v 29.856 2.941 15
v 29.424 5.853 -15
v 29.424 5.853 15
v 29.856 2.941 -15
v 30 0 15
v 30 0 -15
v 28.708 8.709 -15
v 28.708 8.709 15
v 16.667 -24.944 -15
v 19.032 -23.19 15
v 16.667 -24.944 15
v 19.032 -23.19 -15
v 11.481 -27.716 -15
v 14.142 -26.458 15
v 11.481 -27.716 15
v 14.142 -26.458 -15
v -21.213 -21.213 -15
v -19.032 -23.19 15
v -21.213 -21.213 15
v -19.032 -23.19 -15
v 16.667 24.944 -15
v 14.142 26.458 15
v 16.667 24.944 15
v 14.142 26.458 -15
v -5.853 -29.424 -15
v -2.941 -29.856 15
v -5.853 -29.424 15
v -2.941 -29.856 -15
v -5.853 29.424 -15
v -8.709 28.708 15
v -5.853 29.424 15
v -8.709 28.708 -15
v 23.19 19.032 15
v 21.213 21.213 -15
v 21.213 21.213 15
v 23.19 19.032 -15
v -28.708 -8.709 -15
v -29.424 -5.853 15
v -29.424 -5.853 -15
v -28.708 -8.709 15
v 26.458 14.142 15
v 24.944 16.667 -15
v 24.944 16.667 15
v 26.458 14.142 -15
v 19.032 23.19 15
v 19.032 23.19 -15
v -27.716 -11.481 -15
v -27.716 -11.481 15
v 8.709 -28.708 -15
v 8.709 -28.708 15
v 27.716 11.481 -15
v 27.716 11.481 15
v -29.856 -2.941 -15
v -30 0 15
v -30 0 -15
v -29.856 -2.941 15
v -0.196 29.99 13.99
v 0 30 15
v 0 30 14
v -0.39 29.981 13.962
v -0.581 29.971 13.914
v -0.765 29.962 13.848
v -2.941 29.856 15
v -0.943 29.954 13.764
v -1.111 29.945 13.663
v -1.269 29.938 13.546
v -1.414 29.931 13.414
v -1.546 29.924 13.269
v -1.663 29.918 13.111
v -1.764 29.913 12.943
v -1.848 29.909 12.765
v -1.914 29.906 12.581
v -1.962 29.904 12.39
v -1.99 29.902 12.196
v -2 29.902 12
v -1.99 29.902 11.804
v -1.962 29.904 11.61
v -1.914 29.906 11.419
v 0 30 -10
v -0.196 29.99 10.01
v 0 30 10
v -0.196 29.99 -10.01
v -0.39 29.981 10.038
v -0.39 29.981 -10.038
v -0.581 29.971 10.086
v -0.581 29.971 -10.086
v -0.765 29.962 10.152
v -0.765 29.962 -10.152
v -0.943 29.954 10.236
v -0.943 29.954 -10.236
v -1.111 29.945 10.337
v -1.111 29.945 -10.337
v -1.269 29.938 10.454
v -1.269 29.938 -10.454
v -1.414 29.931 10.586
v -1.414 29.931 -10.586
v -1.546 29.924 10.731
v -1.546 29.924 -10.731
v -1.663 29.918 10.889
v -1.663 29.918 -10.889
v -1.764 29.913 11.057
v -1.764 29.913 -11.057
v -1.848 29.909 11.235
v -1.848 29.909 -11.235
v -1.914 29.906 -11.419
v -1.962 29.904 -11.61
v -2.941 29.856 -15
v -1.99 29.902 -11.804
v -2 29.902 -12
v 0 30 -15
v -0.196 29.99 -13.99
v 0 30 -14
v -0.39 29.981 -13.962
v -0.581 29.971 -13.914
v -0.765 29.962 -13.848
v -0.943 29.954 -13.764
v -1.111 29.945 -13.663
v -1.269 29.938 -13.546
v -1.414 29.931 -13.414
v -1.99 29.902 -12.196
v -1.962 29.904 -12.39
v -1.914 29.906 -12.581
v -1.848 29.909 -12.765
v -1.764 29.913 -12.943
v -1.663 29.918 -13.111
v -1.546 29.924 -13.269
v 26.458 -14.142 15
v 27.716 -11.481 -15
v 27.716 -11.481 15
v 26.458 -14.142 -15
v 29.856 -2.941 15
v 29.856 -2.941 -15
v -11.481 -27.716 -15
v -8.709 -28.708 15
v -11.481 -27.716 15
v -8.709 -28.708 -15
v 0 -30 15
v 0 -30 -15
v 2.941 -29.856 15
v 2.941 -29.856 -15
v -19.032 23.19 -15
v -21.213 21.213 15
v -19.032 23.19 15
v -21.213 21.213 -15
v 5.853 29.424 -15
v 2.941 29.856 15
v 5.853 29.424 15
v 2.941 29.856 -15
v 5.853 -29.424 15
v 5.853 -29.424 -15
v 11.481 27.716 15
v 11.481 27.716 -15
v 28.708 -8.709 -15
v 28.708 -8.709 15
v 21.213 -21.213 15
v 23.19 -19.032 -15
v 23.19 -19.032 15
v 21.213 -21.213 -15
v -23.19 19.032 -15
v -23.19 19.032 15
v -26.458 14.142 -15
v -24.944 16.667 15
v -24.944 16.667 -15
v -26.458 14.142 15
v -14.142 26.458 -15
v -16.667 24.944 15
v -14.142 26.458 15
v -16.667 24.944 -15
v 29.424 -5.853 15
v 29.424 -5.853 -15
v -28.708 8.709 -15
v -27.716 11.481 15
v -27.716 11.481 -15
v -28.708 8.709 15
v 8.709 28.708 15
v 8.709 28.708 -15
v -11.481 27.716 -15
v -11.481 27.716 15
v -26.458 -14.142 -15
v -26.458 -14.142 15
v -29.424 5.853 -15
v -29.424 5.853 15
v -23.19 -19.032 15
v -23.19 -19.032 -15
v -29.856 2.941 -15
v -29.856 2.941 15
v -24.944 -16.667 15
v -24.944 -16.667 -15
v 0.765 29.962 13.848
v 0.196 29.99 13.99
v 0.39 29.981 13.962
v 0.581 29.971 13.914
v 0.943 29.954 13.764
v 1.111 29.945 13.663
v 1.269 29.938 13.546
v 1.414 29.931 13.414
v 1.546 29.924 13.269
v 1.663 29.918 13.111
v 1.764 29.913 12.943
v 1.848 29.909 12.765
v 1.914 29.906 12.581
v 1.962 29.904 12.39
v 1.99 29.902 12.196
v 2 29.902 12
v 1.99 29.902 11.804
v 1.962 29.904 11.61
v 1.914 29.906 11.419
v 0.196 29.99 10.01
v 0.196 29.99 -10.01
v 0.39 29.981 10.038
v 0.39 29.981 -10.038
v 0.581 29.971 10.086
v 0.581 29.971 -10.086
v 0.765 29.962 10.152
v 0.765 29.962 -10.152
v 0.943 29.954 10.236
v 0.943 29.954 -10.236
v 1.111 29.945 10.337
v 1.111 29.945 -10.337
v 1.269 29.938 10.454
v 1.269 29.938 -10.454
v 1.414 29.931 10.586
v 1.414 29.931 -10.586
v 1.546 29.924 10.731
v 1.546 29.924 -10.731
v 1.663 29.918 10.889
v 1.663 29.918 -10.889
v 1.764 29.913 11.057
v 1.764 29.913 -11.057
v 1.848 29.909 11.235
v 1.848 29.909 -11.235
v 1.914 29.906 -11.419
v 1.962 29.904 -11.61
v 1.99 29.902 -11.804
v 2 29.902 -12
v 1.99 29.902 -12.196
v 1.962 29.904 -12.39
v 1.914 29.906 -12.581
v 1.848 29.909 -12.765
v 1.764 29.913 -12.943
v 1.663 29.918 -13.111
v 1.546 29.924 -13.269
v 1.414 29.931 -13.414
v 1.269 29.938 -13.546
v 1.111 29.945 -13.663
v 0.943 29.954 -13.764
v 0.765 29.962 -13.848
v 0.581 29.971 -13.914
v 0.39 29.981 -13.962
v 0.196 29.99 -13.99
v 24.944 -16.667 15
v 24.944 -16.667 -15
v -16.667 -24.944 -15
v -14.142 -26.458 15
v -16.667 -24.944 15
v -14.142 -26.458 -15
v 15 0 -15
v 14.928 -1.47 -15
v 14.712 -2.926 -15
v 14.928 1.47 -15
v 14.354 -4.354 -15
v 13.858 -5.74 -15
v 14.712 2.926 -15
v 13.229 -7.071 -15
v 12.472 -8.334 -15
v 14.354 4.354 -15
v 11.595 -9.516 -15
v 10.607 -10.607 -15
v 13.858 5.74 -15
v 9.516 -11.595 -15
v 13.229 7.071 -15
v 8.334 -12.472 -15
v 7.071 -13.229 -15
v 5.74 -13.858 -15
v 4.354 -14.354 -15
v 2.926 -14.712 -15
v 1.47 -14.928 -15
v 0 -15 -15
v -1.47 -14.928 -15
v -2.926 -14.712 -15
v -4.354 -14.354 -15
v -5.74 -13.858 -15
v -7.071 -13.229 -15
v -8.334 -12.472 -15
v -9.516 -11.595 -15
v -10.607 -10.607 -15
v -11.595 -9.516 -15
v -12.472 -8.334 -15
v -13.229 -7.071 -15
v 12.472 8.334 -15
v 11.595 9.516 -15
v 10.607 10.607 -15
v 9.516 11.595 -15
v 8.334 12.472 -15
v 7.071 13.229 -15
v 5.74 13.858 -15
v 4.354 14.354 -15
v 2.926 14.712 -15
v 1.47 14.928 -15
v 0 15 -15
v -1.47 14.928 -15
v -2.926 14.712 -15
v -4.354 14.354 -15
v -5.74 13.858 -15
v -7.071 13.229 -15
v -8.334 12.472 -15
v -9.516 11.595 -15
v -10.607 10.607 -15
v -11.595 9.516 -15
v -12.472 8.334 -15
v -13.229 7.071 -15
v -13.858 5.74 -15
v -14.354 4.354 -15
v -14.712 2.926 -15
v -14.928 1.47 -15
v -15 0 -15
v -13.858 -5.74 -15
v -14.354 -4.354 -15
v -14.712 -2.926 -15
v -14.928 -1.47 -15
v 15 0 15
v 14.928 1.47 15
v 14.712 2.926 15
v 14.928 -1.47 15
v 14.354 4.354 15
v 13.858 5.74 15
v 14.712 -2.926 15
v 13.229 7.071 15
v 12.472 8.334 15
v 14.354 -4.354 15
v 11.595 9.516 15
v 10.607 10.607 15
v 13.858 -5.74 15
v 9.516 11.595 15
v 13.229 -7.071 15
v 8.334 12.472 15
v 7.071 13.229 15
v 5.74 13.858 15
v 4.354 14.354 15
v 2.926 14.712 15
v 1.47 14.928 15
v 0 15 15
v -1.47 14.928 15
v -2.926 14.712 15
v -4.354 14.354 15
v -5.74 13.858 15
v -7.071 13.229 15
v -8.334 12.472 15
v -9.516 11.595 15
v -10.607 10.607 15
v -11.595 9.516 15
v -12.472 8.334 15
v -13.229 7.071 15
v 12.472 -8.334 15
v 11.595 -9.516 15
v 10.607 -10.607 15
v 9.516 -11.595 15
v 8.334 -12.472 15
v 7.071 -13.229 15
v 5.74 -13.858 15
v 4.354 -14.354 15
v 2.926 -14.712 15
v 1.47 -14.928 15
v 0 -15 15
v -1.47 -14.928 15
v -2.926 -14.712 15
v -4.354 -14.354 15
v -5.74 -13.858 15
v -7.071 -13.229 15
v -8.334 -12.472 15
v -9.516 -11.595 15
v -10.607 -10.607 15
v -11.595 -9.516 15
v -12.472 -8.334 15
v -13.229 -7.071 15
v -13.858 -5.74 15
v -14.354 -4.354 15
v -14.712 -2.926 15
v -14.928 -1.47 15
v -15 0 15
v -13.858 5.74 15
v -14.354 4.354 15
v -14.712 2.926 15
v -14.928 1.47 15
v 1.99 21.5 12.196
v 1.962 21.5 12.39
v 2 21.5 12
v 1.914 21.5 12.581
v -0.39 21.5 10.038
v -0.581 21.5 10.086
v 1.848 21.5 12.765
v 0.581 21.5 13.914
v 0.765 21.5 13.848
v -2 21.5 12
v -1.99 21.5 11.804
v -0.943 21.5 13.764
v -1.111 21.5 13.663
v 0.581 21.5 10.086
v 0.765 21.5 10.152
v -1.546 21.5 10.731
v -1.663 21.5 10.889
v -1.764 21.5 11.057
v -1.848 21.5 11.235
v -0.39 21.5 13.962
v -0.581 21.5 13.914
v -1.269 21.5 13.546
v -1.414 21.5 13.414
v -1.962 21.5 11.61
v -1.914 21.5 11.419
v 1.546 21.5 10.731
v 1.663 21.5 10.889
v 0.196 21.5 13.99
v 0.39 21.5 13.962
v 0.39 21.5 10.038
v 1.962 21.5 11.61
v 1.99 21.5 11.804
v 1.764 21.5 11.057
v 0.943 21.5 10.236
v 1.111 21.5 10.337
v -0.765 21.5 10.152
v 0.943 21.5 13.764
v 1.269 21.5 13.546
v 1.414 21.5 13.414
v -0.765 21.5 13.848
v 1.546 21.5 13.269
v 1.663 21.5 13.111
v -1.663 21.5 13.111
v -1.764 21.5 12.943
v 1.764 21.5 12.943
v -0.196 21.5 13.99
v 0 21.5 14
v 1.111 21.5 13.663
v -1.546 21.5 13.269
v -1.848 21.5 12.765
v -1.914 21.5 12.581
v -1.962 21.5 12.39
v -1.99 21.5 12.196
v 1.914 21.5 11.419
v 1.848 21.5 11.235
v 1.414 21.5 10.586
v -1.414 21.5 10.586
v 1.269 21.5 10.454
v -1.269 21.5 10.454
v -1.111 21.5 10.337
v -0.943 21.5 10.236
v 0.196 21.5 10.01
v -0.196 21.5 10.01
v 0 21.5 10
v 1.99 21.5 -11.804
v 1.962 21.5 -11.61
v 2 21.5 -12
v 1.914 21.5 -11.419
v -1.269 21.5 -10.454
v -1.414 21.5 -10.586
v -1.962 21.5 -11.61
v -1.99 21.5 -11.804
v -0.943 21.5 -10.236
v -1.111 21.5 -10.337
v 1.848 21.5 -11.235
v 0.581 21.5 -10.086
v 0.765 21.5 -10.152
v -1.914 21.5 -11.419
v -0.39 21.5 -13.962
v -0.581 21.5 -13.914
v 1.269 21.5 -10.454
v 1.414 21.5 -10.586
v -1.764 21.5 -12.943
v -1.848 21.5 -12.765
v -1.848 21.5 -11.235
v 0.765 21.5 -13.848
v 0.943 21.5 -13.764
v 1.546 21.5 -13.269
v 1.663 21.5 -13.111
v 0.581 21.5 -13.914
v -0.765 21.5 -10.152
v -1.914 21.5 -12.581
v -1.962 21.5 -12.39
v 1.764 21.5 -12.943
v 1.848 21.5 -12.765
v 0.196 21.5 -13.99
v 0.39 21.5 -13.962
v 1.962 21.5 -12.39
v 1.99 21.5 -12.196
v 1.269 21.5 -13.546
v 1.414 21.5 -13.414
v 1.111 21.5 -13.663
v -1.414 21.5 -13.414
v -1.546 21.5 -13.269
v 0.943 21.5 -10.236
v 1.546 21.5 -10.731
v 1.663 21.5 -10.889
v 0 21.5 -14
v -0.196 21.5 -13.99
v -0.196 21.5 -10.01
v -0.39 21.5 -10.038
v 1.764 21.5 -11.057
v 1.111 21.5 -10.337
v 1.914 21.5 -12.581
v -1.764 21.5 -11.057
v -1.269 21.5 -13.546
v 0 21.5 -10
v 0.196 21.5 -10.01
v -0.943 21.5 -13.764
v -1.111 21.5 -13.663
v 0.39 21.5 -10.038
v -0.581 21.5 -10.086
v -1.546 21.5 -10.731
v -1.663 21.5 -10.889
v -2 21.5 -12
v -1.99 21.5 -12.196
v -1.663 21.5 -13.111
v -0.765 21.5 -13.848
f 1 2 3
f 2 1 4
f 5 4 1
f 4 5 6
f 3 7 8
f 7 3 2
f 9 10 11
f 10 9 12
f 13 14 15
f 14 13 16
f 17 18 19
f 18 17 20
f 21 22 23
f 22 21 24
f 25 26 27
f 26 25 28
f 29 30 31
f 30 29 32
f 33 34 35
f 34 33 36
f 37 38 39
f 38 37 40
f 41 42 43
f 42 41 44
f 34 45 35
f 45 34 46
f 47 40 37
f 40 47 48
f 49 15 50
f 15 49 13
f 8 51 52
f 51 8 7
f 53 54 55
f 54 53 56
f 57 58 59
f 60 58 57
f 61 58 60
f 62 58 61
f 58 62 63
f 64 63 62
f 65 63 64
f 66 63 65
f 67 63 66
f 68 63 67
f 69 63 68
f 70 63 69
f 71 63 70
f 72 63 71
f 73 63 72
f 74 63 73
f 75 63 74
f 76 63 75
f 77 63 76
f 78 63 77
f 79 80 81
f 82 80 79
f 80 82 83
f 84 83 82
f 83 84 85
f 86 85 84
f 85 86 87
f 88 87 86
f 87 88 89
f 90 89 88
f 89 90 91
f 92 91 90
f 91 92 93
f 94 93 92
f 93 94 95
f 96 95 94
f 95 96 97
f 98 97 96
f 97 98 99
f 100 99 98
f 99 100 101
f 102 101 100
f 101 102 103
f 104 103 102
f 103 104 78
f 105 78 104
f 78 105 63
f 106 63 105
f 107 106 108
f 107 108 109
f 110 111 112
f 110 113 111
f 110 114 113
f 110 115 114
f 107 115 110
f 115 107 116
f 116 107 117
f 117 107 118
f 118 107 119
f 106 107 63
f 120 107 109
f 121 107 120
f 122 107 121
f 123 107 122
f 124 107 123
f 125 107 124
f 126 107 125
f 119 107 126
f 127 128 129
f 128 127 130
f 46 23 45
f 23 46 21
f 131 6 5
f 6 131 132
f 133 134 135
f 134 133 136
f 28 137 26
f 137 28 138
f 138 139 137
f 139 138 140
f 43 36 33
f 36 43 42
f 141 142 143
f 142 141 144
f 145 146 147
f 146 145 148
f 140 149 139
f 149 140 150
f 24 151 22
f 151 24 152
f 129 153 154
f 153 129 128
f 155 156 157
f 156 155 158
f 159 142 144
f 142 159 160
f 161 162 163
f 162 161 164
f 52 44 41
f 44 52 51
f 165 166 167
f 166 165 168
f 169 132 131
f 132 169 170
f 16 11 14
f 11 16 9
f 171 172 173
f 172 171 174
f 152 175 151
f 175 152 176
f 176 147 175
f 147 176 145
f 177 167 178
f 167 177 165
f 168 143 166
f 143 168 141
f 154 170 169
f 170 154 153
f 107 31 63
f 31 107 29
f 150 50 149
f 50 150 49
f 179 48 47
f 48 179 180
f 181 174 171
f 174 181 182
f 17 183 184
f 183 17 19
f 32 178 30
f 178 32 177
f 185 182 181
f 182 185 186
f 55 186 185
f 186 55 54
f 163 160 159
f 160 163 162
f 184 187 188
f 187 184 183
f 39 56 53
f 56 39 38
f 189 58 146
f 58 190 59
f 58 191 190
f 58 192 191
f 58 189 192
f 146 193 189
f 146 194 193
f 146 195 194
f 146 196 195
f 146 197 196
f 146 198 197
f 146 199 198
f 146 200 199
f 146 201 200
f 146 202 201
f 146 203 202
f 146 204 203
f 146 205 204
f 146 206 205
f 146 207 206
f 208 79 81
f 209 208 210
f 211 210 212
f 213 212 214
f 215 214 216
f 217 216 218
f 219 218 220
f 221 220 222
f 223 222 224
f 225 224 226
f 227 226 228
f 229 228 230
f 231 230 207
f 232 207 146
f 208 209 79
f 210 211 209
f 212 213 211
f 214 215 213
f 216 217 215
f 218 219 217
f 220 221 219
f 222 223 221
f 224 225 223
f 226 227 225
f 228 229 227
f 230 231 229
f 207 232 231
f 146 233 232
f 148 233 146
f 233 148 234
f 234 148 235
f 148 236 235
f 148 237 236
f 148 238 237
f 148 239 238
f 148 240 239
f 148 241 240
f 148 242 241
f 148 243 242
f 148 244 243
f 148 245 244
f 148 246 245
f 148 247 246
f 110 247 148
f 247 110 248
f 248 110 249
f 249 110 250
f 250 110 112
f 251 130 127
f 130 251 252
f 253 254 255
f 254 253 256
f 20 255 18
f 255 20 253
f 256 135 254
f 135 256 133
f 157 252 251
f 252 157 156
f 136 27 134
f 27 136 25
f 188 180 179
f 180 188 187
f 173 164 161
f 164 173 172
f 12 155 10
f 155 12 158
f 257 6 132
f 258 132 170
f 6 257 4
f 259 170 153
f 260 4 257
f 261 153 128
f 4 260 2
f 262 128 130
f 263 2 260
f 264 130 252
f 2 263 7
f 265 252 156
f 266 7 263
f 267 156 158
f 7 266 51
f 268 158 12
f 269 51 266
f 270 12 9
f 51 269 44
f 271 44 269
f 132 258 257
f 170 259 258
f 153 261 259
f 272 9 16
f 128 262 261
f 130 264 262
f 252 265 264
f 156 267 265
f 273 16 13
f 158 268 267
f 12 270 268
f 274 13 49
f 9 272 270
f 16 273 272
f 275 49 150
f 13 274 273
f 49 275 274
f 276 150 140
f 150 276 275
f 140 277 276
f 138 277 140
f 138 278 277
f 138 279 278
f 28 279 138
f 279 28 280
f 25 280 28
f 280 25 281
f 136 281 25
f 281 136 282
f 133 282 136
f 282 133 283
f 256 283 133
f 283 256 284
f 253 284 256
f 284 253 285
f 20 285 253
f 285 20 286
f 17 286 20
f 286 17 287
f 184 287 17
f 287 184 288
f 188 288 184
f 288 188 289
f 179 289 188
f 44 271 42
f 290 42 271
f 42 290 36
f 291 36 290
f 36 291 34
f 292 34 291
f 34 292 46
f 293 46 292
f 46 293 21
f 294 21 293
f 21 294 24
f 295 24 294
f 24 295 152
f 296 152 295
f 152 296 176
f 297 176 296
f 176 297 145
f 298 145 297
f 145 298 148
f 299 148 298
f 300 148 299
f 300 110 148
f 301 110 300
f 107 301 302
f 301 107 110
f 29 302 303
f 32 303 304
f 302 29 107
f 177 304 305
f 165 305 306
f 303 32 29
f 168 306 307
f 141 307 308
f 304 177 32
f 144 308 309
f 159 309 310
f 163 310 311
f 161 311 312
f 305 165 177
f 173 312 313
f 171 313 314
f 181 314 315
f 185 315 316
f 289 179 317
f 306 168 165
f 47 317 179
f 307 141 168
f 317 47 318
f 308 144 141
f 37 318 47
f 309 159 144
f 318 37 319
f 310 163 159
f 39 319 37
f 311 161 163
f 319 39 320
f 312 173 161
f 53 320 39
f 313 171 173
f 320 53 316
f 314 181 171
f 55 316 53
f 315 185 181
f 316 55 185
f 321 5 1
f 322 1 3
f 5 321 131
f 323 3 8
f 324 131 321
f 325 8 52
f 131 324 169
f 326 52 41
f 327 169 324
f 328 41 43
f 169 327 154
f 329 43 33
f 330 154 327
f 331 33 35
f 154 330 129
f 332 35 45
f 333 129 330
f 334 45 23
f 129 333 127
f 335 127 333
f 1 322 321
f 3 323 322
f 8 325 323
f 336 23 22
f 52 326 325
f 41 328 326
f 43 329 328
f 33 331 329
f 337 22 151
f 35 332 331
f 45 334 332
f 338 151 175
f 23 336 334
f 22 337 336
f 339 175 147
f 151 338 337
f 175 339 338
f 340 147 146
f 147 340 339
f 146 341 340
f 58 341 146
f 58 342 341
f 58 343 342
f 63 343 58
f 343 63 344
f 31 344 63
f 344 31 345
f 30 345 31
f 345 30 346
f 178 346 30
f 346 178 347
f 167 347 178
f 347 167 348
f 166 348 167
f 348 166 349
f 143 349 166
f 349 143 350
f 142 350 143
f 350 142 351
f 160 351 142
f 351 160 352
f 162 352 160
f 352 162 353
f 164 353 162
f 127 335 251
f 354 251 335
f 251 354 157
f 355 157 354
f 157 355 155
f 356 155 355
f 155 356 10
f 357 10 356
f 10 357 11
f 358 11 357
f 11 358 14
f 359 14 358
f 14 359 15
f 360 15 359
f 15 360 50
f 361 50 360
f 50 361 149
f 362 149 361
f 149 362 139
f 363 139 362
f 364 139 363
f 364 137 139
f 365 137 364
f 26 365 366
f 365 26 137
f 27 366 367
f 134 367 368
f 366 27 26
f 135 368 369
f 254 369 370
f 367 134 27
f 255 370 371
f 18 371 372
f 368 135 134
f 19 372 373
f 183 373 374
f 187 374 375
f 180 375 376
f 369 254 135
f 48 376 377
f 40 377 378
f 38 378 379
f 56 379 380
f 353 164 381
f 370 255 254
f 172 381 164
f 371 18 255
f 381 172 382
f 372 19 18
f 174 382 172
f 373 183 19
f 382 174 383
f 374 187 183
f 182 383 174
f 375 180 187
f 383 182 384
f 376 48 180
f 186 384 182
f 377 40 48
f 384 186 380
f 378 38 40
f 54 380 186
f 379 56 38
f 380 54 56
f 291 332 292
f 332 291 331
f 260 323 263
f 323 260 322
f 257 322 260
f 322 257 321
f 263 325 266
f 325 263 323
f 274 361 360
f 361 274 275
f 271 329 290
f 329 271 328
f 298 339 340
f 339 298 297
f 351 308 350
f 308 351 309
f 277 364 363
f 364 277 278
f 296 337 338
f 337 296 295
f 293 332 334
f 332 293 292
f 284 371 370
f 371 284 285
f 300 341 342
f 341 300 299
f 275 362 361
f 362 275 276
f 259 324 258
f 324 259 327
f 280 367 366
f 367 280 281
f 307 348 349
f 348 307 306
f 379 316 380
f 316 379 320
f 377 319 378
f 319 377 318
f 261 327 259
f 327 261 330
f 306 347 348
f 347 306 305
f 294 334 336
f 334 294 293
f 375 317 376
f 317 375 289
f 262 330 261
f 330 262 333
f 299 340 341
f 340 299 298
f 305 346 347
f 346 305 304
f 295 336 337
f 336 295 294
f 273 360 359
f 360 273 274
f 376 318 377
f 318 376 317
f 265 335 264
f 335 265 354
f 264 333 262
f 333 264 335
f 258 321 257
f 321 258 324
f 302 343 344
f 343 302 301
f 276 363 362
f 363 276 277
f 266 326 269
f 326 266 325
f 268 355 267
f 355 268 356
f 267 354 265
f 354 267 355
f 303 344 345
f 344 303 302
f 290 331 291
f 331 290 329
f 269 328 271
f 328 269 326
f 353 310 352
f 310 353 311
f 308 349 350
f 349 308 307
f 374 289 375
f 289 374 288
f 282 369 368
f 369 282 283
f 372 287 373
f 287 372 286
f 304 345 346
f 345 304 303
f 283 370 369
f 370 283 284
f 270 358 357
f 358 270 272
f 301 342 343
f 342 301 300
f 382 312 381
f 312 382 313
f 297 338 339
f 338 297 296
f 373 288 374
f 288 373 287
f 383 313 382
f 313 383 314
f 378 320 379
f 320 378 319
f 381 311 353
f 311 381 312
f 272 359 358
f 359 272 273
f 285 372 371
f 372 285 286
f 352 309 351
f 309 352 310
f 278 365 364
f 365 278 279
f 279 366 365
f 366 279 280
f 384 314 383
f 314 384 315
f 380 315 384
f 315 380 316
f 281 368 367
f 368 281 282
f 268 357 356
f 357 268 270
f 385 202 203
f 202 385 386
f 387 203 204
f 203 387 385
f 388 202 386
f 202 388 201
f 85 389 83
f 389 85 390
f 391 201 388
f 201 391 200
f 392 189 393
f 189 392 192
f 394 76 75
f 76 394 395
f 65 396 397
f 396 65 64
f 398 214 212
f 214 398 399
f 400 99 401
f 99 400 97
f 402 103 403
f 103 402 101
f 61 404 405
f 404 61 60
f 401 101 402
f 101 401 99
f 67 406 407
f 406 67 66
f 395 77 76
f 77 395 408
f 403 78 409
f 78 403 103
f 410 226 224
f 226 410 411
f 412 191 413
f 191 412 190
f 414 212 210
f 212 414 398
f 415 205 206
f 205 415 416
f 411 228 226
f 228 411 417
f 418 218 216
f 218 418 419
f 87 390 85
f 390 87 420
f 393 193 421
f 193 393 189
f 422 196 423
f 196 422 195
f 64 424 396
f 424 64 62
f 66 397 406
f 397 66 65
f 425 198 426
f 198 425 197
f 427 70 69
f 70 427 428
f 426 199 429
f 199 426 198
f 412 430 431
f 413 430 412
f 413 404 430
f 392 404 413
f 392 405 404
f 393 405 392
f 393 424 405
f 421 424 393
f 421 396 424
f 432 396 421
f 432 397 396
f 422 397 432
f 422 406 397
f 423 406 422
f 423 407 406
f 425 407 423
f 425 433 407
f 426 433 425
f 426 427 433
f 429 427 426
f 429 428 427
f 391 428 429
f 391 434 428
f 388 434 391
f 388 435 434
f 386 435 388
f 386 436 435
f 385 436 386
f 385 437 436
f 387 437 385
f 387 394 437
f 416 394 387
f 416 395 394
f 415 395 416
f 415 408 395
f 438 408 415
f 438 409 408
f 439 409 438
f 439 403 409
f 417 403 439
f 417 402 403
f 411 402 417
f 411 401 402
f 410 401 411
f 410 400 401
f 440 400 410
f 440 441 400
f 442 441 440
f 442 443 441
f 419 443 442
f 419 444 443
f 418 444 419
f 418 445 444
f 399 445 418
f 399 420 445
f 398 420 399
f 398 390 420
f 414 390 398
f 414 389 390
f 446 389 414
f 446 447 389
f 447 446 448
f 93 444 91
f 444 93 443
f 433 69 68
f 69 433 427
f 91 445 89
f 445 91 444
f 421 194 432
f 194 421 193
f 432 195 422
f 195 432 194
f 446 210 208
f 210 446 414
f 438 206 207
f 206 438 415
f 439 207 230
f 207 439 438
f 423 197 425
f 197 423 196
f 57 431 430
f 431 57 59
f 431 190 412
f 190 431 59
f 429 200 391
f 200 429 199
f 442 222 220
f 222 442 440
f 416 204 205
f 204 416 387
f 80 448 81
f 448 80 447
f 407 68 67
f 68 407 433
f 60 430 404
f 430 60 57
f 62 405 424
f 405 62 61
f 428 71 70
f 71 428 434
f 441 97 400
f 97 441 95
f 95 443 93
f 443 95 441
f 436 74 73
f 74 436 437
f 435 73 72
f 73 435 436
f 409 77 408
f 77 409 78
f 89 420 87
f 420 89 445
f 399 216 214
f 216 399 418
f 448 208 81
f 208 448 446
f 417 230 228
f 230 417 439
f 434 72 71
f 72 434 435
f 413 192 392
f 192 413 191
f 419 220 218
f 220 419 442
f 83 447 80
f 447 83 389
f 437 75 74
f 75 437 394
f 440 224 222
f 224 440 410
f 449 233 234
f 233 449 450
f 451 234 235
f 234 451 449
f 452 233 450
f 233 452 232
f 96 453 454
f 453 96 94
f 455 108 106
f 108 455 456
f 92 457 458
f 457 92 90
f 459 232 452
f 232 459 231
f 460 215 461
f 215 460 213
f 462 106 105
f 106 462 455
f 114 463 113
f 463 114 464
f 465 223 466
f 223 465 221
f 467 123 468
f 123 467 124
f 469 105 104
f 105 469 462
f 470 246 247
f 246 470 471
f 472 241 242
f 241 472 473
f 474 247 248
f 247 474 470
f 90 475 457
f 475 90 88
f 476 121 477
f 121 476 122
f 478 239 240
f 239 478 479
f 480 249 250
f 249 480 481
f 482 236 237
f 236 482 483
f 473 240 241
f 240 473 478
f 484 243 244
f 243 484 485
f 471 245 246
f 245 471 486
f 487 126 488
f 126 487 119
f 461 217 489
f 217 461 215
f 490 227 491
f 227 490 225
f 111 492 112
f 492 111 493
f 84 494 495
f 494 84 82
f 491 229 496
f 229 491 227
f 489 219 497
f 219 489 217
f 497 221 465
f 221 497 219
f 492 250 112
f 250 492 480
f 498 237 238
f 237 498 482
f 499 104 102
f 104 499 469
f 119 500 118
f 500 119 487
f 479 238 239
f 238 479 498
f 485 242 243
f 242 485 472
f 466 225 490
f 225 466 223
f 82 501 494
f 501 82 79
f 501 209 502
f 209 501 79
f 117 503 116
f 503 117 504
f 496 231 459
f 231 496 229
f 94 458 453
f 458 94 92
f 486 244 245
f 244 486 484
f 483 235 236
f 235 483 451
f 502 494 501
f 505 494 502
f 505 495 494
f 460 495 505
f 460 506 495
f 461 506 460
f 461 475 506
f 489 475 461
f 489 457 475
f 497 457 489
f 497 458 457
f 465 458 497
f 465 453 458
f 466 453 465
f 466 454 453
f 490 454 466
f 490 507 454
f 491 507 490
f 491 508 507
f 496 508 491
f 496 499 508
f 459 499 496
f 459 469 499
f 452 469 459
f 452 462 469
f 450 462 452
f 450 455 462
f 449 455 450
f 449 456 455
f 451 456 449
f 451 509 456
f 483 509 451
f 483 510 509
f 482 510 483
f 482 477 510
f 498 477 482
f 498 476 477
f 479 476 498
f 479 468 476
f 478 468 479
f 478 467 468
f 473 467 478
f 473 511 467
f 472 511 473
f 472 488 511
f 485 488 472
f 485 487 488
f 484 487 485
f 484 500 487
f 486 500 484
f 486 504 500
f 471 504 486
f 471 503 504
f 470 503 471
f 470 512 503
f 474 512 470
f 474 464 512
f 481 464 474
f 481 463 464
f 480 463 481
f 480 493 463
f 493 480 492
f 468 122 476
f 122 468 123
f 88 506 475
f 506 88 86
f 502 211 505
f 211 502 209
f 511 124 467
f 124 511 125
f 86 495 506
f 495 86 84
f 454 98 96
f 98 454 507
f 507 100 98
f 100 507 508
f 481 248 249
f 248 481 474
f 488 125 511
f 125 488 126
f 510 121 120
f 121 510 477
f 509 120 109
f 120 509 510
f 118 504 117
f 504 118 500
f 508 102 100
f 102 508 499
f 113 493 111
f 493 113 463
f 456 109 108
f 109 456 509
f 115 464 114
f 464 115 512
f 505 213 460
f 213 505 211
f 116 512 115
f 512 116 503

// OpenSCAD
// COBRA Vertebra - C4 V3
// Height: 30.0mm, OD: 60.0mm

$fn = 64;

difference() {
    // Outer cylinder
    cylinder(h=30.0, d=60.0, center=true);
    
    // Inner channel
    cylinder(h=32.0, d=30.0, center=true);

    // Pivot holes
    translate([0, 30.0, 12.0])
    rotate([90, 0, 0])
    cylinder(h=17.0, d=4, center=true);
    
    translate([0, 30.0, -12.0])
    rotate([90, 0, 0])
    cylinder(h=17.0, d=4, center=true);
}
